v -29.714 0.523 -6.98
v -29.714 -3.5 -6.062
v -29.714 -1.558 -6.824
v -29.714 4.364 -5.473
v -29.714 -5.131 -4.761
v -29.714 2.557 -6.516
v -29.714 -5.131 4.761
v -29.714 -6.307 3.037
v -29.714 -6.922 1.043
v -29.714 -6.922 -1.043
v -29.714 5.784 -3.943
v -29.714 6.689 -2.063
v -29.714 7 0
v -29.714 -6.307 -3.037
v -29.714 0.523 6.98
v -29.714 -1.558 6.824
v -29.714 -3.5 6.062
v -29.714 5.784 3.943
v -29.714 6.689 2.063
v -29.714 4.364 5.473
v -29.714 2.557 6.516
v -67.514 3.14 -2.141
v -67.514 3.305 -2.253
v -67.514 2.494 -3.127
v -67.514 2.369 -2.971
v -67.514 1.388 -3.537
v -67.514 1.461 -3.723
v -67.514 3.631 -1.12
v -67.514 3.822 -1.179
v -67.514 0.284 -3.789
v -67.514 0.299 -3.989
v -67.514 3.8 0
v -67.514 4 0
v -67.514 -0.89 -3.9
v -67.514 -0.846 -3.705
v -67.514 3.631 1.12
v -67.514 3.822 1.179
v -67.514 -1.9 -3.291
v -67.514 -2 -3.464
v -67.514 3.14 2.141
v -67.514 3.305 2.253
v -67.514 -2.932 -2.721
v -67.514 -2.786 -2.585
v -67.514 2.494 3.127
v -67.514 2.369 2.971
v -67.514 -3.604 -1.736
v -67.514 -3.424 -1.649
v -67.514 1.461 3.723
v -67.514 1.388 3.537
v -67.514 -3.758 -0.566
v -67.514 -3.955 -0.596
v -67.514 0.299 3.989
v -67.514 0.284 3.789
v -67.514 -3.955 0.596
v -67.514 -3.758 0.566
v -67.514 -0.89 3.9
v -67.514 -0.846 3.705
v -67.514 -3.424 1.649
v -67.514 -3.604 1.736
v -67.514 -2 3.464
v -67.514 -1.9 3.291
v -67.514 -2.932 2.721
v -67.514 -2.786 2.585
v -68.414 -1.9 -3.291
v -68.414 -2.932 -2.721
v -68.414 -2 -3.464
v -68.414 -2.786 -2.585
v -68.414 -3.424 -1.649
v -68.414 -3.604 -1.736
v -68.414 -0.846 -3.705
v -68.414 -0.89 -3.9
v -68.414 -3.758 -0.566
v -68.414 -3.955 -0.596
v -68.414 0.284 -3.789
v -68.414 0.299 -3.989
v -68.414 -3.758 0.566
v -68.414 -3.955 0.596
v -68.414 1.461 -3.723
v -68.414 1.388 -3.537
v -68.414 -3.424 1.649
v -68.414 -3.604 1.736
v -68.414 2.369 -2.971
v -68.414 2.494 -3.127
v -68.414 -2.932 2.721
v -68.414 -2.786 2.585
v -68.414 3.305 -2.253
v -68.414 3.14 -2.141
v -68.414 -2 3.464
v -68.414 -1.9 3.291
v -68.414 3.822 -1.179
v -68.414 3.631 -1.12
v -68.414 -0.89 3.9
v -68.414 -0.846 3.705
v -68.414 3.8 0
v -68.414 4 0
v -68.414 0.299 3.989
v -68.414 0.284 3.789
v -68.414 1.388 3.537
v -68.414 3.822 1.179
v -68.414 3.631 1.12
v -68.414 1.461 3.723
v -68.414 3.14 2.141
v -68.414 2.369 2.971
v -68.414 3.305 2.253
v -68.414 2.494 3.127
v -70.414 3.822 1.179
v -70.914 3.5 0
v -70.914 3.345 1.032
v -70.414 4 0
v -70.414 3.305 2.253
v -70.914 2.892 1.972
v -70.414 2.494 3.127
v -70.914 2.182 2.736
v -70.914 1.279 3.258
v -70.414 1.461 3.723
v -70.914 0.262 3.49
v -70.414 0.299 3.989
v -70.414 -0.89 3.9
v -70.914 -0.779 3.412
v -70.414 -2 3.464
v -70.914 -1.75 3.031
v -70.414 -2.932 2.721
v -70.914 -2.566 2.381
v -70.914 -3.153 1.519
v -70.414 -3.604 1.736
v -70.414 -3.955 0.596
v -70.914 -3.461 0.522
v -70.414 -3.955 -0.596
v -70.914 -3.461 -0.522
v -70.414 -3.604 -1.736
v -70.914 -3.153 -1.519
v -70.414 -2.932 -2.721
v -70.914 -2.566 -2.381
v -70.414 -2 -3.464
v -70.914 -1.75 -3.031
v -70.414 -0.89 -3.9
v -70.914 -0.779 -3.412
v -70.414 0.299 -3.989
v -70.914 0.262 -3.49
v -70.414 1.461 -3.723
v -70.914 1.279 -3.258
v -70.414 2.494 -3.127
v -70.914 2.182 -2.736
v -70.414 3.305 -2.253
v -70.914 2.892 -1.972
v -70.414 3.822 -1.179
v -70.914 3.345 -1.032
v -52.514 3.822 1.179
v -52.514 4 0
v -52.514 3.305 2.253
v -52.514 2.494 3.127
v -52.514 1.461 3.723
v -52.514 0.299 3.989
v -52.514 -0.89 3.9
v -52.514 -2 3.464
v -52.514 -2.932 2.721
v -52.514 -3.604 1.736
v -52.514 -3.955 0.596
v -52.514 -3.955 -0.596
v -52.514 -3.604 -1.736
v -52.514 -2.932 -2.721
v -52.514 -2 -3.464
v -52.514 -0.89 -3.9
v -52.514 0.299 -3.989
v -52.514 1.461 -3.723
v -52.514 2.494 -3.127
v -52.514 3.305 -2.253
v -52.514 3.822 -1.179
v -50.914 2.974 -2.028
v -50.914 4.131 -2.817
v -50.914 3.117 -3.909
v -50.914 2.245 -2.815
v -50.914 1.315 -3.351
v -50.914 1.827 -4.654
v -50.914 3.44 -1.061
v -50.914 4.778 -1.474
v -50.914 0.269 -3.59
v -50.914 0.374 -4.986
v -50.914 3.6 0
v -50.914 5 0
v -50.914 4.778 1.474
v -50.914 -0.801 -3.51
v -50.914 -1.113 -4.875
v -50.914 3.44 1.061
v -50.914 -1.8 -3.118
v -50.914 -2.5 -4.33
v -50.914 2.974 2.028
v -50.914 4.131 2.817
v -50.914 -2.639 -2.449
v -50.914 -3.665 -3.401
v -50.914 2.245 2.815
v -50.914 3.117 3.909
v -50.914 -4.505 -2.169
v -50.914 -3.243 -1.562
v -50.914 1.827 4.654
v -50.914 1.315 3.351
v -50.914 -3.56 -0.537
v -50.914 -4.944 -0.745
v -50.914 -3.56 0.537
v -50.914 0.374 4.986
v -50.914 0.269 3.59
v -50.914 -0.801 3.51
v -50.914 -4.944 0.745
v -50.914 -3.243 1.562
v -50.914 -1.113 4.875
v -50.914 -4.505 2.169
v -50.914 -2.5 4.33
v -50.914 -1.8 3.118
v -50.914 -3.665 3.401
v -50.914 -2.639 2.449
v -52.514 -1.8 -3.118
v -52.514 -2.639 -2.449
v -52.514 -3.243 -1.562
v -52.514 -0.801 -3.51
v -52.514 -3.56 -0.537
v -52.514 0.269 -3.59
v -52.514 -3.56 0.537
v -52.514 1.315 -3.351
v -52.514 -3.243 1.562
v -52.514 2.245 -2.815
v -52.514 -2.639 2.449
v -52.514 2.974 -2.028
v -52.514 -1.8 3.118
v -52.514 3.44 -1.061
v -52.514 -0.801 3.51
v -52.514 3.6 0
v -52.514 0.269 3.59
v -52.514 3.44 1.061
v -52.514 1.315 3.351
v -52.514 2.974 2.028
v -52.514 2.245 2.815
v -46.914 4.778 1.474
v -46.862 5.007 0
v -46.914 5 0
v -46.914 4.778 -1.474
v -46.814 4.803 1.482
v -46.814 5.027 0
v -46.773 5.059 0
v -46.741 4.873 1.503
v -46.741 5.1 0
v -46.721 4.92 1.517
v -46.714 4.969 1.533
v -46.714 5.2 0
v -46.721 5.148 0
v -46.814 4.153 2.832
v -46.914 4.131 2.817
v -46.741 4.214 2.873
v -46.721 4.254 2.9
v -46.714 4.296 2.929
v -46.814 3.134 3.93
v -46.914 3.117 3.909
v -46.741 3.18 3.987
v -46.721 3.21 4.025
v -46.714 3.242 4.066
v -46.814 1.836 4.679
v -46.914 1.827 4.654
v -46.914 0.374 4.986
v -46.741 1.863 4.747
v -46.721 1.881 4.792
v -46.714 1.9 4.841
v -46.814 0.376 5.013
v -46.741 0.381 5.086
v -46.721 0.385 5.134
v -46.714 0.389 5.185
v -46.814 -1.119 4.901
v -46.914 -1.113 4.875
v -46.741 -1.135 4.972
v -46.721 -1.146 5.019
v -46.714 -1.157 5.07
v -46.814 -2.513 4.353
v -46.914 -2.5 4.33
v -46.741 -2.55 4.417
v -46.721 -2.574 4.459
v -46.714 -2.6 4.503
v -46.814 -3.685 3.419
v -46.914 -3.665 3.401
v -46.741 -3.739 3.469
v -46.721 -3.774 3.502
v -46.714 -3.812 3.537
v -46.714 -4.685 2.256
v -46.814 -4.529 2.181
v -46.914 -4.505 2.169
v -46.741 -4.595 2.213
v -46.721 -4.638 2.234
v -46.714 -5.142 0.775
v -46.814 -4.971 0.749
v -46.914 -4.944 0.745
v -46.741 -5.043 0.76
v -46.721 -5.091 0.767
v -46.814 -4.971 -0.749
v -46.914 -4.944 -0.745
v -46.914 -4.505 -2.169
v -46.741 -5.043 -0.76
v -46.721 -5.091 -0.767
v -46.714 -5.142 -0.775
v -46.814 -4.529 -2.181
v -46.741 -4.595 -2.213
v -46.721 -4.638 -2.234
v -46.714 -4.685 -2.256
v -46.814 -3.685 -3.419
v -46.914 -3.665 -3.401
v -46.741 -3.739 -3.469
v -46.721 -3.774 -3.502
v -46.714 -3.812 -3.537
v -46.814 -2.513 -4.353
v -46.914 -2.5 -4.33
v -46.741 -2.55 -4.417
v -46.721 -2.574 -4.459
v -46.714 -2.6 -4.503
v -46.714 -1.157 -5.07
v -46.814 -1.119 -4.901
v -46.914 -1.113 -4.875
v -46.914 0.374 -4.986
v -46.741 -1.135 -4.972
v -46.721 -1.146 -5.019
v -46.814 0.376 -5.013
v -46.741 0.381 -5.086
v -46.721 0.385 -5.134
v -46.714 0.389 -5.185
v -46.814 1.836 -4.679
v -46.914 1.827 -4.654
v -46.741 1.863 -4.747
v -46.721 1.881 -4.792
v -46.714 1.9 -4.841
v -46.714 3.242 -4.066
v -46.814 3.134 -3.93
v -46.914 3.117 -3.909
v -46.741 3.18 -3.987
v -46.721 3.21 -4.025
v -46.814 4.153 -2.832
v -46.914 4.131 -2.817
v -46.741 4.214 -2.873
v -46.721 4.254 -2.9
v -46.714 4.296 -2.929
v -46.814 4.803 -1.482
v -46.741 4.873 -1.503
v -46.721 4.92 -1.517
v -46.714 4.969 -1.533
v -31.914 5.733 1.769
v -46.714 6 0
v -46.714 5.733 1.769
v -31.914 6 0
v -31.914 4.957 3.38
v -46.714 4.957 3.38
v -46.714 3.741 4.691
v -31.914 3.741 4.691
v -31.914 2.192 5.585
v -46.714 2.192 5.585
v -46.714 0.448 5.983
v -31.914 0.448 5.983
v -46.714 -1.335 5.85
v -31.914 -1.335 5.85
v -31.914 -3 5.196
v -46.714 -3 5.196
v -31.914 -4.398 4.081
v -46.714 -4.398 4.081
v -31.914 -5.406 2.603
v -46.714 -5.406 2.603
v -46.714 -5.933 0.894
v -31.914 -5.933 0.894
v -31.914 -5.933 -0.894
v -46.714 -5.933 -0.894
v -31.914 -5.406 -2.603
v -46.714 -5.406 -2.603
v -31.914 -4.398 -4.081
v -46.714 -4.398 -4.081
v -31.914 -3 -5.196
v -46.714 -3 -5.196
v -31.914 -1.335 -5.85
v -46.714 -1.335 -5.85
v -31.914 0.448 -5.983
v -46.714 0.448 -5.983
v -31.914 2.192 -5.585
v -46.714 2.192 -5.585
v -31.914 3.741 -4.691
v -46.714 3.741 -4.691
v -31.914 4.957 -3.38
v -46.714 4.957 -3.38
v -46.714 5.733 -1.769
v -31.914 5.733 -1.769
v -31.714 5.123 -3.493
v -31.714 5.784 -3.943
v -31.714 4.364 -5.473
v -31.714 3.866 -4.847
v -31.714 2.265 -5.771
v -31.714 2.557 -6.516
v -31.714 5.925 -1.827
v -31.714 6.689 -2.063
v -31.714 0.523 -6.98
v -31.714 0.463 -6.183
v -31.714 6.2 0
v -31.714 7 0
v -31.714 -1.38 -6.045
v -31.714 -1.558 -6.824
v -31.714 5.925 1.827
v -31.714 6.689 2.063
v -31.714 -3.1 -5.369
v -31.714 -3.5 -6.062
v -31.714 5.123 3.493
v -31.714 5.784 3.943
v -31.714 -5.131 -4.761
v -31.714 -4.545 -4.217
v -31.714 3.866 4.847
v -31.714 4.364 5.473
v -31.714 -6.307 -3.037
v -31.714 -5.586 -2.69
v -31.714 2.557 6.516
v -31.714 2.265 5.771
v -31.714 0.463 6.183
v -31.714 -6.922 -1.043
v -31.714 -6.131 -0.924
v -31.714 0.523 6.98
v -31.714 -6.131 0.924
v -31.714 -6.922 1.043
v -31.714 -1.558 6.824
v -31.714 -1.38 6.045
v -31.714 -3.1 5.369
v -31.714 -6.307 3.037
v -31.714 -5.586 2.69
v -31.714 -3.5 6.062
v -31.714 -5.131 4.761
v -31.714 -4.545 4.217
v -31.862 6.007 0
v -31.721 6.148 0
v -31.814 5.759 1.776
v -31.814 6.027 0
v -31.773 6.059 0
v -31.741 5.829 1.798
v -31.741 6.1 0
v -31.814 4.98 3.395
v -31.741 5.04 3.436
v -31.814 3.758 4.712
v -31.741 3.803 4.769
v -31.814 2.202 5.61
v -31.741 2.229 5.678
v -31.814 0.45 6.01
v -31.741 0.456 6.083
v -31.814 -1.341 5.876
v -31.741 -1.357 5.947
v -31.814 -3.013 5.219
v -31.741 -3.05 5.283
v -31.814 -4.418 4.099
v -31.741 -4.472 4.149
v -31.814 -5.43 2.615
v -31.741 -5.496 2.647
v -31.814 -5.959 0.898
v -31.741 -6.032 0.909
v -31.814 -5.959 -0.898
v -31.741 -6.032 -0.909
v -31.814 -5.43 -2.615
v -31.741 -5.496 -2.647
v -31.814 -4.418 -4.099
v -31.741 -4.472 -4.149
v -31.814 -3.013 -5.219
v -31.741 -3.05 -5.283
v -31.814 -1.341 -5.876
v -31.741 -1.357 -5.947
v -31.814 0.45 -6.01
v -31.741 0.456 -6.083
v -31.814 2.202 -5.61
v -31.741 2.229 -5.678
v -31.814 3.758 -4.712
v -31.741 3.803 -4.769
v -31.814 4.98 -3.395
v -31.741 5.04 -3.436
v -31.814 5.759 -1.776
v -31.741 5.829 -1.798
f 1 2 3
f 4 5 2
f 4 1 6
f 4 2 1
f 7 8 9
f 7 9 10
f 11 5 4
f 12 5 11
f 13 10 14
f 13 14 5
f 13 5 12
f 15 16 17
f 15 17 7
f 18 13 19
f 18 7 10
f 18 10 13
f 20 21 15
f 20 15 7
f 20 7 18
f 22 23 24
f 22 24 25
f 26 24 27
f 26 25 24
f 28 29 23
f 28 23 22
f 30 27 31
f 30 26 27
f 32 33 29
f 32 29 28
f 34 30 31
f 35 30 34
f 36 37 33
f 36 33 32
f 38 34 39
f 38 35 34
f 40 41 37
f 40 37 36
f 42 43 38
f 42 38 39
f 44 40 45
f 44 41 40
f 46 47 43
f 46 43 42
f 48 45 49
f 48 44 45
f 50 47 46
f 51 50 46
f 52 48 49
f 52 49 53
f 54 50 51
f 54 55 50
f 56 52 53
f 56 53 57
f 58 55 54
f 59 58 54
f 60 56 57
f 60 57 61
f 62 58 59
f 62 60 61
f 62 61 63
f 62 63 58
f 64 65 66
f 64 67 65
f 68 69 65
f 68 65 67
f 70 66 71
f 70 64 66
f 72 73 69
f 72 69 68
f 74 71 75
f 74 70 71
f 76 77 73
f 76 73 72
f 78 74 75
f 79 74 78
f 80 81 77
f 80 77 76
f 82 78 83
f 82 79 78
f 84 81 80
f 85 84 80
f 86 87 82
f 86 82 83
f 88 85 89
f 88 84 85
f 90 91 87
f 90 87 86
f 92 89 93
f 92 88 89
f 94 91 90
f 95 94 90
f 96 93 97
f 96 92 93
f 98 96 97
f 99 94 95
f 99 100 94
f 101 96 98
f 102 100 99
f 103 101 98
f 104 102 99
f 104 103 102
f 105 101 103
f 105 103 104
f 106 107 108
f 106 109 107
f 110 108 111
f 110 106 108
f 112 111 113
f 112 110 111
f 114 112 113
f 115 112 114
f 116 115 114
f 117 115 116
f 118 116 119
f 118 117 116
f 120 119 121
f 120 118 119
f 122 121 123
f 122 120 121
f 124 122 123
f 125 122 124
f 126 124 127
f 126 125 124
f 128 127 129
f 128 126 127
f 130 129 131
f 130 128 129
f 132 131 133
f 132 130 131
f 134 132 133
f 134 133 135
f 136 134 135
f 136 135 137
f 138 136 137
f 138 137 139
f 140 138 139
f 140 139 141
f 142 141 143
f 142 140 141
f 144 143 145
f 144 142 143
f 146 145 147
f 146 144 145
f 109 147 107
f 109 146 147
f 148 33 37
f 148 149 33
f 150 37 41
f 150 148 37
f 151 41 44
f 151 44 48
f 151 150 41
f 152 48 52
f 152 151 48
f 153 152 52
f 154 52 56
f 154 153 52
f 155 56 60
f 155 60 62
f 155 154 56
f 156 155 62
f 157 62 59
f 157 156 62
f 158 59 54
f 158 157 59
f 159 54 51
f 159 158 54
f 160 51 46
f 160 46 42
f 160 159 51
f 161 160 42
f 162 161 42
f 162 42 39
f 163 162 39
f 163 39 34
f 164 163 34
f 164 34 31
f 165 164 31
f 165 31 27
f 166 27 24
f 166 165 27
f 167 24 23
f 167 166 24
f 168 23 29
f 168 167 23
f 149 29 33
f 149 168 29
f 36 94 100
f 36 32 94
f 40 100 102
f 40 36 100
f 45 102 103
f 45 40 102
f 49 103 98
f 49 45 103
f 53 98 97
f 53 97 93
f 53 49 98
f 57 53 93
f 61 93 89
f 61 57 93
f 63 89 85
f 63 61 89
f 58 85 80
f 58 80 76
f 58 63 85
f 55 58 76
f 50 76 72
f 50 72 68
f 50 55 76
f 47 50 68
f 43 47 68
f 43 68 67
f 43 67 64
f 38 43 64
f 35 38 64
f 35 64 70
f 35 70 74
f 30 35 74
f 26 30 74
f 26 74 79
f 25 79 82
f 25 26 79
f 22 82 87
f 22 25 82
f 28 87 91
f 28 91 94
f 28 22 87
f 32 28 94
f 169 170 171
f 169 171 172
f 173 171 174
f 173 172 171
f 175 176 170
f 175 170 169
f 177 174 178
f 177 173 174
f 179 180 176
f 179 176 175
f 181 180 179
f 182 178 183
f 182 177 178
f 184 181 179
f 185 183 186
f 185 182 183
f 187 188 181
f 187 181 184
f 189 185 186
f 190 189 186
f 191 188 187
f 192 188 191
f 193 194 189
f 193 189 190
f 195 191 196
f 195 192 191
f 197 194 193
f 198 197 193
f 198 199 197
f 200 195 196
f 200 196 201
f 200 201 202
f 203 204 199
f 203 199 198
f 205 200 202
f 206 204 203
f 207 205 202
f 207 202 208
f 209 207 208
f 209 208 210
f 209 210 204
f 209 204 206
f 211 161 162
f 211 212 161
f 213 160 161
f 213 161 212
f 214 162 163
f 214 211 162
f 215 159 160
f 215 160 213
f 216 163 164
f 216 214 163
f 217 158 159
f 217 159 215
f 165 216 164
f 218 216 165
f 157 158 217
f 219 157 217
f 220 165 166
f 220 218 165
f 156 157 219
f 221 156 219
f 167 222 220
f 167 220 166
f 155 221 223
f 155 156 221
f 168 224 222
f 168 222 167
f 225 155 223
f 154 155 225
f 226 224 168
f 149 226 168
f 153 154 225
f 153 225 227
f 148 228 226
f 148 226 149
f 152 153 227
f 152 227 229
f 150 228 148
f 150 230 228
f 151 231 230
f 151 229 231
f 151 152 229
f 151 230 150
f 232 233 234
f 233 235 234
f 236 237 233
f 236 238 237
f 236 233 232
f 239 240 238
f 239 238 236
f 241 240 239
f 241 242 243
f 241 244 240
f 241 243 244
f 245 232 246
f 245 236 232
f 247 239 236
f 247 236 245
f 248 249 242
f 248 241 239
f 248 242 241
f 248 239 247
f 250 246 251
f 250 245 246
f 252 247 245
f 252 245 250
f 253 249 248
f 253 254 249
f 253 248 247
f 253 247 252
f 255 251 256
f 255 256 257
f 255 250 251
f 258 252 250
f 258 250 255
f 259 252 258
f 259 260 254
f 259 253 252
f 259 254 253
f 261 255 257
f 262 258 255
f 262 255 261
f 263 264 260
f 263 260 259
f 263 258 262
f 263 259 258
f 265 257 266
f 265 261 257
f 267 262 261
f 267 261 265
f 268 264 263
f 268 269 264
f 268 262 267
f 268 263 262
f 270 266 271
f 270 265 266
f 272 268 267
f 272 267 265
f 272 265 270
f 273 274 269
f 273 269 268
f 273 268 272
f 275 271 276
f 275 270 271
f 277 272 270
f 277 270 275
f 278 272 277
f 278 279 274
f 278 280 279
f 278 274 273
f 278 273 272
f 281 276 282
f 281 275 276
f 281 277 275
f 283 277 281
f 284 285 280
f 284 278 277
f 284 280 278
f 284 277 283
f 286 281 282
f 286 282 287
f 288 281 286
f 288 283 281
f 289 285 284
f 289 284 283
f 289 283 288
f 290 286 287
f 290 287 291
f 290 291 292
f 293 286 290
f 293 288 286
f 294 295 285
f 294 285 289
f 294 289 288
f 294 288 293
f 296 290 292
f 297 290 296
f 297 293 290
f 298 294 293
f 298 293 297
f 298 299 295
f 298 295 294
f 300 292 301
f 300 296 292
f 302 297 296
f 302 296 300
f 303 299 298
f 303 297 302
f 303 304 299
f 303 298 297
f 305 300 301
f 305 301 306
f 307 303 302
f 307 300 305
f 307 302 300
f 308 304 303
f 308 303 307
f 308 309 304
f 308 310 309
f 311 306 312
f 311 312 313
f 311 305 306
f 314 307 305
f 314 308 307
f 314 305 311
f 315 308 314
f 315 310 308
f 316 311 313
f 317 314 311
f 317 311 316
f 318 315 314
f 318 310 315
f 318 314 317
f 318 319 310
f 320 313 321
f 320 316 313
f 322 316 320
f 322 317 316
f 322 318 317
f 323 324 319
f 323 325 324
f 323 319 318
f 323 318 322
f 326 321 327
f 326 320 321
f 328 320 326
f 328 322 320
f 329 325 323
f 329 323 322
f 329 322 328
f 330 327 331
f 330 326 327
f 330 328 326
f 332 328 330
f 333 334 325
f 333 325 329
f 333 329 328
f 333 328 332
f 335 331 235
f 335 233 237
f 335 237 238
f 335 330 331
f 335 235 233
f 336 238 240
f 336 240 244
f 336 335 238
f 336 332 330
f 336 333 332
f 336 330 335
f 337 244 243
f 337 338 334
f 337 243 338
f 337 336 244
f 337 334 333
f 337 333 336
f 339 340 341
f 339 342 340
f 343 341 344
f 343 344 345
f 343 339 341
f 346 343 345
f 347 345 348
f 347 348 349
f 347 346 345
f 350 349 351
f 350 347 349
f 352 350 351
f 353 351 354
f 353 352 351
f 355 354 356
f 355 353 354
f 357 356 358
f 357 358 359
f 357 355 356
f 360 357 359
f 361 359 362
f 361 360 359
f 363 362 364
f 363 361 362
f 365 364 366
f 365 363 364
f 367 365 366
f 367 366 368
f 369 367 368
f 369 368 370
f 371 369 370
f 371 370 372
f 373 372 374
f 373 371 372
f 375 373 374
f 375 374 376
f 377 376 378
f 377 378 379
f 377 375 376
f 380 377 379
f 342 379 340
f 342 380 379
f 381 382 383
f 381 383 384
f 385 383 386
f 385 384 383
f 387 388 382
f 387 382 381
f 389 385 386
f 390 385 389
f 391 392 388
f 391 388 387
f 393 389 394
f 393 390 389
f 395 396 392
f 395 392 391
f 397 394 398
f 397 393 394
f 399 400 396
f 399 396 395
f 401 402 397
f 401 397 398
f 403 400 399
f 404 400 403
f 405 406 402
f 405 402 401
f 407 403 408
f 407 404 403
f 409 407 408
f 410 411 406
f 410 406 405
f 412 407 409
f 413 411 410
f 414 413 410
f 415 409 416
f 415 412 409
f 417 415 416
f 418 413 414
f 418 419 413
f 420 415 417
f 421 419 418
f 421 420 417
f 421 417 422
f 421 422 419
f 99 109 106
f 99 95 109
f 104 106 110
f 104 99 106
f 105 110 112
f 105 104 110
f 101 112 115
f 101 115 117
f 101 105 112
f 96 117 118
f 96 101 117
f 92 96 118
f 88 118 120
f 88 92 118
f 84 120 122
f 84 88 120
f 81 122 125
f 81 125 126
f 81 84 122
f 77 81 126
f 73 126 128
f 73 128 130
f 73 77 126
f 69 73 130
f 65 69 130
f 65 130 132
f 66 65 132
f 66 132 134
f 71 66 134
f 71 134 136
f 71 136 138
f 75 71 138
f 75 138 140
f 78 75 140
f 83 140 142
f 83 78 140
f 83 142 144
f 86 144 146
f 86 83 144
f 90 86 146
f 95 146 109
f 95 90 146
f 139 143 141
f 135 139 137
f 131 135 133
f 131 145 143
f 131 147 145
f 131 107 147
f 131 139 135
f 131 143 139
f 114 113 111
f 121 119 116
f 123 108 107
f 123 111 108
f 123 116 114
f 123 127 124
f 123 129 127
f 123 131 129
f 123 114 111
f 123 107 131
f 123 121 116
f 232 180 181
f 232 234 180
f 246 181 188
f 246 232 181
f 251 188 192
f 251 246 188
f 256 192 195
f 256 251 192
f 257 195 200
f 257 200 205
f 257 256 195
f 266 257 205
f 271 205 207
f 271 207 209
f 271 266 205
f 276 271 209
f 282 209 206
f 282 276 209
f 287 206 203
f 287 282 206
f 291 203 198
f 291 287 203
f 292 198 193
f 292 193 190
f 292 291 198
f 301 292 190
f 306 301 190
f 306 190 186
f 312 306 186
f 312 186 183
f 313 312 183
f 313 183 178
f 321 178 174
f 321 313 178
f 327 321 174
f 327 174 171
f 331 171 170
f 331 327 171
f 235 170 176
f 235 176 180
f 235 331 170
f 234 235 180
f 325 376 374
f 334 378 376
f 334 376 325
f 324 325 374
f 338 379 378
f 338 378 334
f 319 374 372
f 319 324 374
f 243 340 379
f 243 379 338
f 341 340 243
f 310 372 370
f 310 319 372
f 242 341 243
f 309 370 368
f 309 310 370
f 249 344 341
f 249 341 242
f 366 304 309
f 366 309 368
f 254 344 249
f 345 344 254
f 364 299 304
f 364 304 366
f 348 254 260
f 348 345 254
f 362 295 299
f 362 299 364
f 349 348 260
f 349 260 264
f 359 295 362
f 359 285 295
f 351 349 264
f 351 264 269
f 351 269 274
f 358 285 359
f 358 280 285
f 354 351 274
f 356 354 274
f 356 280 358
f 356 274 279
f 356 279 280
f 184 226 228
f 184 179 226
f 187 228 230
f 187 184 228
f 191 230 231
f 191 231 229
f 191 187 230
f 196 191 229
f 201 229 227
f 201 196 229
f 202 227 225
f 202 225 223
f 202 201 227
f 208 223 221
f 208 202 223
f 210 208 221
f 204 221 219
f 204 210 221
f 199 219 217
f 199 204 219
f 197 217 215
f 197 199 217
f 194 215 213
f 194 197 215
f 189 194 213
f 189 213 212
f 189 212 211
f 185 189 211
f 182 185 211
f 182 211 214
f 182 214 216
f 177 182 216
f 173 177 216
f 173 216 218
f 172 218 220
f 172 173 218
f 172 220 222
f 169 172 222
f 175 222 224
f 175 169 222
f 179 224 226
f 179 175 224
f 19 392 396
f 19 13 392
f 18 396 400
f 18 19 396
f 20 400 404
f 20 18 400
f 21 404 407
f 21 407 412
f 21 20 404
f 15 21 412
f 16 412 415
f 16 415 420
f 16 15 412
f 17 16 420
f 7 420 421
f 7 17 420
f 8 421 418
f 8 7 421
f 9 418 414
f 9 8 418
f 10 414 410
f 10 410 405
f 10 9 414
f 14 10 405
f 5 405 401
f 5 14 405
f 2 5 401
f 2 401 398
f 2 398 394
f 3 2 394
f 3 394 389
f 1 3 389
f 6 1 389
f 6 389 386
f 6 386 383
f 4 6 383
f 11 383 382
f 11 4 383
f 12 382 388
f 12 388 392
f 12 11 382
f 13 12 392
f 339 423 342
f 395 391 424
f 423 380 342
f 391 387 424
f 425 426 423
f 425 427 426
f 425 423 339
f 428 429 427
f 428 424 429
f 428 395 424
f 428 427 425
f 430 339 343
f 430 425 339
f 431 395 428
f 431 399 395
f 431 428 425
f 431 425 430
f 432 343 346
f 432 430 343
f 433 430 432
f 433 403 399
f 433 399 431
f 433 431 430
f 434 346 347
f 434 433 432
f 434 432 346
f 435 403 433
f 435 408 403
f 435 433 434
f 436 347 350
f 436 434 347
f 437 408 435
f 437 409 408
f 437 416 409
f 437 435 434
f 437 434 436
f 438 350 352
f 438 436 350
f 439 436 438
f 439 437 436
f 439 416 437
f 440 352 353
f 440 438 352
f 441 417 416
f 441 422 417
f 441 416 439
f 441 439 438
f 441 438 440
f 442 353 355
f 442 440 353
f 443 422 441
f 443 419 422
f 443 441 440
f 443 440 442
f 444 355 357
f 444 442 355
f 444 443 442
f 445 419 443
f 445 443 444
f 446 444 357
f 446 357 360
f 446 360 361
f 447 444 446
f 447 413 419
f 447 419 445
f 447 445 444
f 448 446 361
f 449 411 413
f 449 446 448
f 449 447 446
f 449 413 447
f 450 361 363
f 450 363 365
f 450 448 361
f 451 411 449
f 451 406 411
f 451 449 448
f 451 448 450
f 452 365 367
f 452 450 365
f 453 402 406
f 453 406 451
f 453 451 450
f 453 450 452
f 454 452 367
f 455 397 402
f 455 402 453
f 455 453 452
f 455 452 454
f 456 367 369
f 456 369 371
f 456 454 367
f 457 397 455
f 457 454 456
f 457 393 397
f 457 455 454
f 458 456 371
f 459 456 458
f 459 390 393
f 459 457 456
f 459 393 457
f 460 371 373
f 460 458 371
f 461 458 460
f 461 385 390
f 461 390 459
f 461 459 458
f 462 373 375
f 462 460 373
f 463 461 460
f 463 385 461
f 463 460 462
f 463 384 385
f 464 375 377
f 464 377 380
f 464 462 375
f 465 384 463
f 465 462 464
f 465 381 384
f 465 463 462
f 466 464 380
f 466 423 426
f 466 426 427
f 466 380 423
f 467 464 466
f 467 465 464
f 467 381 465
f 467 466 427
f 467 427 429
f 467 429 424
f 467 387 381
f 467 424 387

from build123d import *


with BuildPart() as part:
    # 草图1 → 旋转1 (revolve)
    with BuildSketch(Plane.XY):
        with BuildLine():
            Line((-70.913736012, 0), (-70.913736012, 3.5))
            Line((-70.913736012, 3.5), (-70.413736012, 4))
            Line((-70.413736012, 4), (-68.413986014, 4))
            Line((-68.413986014, 4), (-68.413986014, 3.8))
            Line((-68.413986014, 3.8), (-67.513986014, 3.8))
            Line((-67.513986014, 3.8), (-67.513986014, 4))
            Line((-67.513986014, 4), (-52.513986014, 4))
            Line((-52.513986014, 4), (-52.513986014, 3.6))
            Line((-52.513986014, 3.6), (-50.913986014, 3.6))
            Line((-50.913986014, 3.6), (-50.913986014, 4.1))
            Line((-50.913986014, 4.1), (-50.913986014, 5))
            Line((-50.913986014, 5), (-46.913986014, 5))
            ThreePointArc((-46.913986014, 5), (-46.772564658, 5.058578644), (-46.713986014, 5.2))
            Line((-46.713986014, 5.2), (-46.713986014, 6))
            Line((-46.713986014, 6), (-31.913986014, 6))
            ThreePointArc((-31.913986014, 6), (-31.772564658, 6.058578644), (-31.713986014, 6.2))
            Line((-31.713986014, 6.2), (-31.713986014, 7))
            Line((-31.713986014, 7), (-29.713986014, 7))
            Line((-29.713986014, 7), (-29.713986014, 0))
            Line((-29.713986014, 0), (-70.913736012, 0))
        make_face()
    revolve(axis=Axis((-99.953379953, 0, 0), (1, 0, 0)))


solid = part.part
